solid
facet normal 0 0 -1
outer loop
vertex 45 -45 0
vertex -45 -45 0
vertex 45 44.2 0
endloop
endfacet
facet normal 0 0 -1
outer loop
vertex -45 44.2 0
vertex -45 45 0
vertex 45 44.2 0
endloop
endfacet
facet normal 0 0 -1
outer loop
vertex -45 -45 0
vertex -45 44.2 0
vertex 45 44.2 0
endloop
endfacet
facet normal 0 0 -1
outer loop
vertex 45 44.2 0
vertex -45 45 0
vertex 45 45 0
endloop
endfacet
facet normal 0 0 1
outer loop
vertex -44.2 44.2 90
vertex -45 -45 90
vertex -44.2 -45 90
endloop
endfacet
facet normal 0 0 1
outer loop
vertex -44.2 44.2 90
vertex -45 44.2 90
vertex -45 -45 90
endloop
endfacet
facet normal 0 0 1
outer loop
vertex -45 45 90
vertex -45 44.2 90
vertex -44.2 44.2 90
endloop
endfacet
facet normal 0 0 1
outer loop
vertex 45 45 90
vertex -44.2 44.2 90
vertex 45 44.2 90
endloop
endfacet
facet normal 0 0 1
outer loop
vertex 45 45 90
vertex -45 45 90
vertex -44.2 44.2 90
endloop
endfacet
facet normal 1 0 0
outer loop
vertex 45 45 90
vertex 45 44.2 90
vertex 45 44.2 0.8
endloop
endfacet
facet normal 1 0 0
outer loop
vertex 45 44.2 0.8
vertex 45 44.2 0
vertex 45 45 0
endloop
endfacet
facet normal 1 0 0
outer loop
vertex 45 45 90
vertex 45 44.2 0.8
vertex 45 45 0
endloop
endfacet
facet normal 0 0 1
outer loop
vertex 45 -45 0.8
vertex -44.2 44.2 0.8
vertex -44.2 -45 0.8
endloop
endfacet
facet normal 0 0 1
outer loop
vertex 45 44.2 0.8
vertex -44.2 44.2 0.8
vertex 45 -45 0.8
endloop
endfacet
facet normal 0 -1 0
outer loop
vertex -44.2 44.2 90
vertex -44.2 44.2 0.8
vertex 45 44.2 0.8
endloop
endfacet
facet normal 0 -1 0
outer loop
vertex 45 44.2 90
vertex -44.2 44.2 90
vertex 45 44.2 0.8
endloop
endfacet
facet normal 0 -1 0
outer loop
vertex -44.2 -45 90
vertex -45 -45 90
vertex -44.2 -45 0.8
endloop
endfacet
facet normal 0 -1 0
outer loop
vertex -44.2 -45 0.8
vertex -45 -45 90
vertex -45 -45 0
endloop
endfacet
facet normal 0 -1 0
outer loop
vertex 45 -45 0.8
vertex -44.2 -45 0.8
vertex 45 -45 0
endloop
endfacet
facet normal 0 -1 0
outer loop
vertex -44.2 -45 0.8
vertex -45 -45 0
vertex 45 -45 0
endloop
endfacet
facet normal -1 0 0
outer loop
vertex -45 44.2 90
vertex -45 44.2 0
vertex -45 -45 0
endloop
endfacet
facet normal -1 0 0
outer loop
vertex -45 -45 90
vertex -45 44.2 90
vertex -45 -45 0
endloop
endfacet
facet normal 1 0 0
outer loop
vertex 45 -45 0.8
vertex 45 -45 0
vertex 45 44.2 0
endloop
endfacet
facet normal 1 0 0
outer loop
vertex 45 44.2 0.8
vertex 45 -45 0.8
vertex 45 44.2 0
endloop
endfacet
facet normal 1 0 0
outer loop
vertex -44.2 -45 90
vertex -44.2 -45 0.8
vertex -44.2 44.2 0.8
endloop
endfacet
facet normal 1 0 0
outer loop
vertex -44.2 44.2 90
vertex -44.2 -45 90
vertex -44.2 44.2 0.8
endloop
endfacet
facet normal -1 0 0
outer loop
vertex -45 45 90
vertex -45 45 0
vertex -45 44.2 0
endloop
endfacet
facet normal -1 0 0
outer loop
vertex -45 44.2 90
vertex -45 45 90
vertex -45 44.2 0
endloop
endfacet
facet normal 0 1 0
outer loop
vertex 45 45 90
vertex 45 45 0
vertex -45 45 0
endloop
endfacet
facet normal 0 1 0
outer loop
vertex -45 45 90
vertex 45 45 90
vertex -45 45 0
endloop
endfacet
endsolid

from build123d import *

# Parameters (mm, degrees)
F0_W     = 89.2000017881
F0_H     = 89.2
F1_DEPTH = 0.8
F2_DEPTH = 90


# Not quite as in the source:
# - ends of sketch curves that miss each other by under 0.0002 mm in the source are joined


with BuildPart() as f1:
    # F0 (on Top) → F1 (new body)
    with BuildSketch(Plane.XY):
        with Locations((0.3999991059, -0.4)):
            Rectangle(F0_W, F0_H)
    extrude(amount=F1_DEPTH)

    # F0 (on Top) → F2 (join)
    with BuildSketch(Plane.XY):
        Polygon((-45, -45), (-44.2000017881, -45), (-44.2000017881, 44.2), (-45.0000017881, 44.2), align=None)
        Polygon((-44.2000017881, 44.2), (44.9999982119, 44.2), (45, 45), (-45, 45), (-45, 44.2), align=None)
    extrude(amount=F2_DEPTH)


solid = f1.part
